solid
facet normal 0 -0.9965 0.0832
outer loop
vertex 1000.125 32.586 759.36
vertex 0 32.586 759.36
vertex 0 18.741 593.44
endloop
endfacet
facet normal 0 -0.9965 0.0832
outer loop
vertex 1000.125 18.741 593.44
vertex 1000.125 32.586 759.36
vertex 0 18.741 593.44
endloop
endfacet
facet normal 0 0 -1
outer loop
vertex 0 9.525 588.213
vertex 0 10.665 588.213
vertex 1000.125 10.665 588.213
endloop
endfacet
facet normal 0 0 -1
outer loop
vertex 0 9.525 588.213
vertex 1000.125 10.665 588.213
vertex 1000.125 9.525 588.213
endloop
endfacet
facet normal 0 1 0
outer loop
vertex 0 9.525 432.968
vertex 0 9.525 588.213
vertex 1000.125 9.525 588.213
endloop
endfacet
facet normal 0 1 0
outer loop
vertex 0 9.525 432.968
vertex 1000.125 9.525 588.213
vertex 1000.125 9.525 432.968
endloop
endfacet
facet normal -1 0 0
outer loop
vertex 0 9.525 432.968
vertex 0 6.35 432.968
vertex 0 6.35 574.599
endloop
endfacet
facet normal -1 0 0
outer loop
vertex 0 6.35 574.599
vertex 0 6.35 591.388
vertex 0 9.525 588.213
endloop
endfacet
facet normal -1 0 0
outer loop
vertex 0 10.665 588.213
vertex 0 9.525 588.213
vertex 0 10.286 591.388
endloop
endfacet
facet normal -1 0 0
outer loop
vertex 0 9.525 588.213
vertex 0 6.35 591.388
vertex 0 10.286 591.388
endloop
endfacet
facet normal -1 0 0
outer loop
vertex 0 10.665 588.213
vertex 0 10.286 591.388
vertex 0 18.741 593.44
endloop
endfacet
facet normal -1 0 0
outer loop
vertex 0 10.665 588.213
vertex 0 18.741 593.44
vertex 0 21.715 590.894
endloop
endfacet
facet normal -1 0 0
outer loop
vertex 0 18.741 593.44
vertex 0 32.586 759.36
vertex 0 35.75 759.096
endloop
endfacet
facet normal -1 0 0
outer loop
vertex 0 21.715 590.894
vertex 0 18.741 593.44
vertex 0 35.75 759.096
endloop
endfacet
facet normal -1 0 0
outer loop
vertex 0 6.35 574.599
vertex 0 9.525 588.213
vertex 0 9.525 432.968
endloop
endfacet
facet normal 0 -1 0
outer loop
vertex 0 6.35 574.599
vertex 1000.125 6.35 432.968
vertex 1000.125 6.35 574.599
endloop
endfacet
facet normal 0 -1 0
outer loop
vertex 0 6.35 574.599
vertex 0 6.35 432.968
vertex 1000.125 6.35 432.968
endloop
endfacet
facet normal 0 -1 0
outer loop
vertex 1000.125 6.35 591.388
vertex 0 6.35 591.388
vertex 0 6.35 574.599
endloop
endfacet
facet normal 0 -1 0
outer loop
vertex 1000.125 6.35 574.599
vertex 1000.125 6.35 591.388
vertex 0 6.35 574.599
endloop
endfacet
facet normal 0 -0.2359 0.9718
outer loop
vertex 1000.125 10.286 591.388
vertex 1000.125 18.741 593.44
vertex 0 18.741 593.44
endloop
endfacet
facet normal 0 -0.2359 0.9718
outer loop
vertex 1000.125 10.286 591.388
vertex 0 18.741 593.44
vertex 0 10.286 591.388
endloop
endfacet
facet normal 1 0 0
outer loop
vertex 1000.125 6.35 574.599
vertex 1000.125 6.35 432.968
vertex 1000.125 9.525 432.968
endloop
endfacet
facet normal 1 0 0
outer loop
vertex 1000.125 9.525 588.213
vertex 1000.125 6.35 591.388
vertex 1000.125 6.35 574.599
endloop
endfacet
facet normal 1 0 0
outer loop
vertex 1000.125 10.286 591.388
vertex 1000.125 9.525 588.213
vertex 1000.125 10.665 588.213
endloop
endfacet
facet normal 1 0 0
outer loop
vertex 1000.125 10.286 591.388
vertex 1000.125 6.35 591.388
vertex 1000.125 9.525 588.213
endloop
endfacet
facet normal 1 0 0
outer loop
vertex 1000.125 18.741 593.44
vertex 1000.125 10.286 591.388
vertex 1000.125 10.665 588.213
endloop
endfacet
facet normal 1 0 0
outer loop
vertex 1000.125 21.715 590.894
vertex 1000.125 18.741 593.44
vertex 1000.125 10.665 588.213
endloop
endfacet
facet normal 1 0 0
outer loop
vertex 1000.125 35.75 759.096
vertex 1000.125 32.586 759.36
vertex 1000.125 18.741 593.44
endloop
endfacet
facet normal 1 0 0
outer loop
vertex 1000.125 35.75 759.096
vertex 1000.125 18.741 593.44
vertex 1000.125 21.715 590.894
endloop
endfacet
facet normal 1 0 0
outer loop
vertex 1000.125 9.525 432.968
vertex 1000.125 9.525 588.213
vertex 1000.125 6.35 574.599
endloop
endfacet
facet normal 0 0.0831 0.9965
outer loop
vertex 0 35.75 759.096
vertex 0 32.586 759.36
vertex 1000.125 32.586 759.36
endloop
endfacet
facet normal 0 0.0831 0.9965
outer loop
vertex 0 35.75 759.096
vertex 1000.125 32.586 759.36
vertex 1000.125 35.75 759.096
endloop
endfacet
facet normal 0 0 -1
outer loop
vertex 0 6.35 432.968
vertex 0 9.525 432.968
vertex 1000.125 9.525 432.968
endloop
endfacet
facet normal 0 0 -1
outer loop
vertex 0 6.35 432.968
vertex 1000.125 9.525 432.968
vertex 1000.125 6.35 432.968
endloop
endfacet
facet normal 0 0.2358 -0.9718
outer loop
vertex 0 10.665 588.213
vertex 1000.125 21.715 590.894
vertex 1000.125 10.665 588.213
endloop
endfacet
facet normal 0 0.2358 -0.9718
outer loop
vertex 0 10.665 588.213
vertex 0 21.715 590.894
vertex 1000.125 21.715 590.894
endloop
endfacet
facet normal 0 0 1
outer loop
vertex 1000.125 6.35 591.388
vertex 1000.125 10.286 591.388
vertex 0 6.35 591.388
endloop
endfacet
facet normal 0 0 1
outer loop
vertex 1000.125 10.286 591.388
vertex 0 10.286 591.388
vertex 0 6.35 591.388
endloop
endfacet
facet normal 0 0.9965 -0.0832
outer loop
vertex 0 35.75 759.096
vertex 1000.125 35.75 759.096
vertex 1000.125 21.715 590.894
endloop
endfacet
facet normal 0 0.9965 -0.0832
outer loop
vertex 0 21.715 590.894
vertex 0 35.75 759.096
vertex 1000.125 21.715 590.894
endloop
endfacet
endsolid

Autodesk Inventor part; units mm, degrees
ref_plane "YZ Plane" through (0, 0, 0) normal (1, 0, 0) x (0, 1, 0)
ref_plane "XZ Plane" through (0, 0, 0) normal (0, 1, 0) x (-1, 0, 0)
ref_plane "XY Plane" through (0, 0, 0) normal (0, 0, 1) x (1, 0, 0)
sketch "Sketch1" plane through (0, 0, 0) normal (1, 0, 0) x (0, 1, 0)
  line L0 (0, 0) -> (0, 597.7382)
  line L1 (0, 0) -> (3.175, 0)
  line L2 (3.175, 0) -> (3.175, 594.5632)
  line L3 (3.175, 594.5632) -> (9.906, 594.5632)
  line L4 (9.906, 594.5632) -> (15.756, 595.9828)
  line L5 (0, 597.7382) -> (9.5263, 597.7382)
  line L6 (9.5263, 597.7382) -> (12.7824, 598.5283)
  line L7 (41.2921, 902.0052) -> (15.756, 595.9828)
  line L8 (12.7824, 598.5283) -> (38.1281, 902.2692)
  line L9 (38.1281, 902.2692) -> (41.2921, 902.0052)
  line L10 (41.2921, 902.0052) -> (44.4671, 901.7403)
  line L11 (44.4671, 901.7403) -> (18.7409, 593.44)
  line L12 (18.7409, 593.44) -> (10.2857, 591.3882)
  line L13 (10.2857, 591.3882) -> (6.35, 591.3882)
  line L14 (6.35, 591.3882) -> (6.35, 574.5988)
  line L15 (6.35, 574.5988) -> (3.175, 574.5988)
  line L16 (44.4671, 901.7403) -> (47.6311, 901.4763)
  line L17 (47.6311, 901.4763) -> (21.7146, 590.8944)
  line L18 (21.7146, 590.8944) -> (10.6654, 588.2132)
  line L19 (10.6654, 588.2132) -> (9.525, 588.2132)
  line L20 (9.525, 588.2132) -> (9.525, 432.9684)
  line L21 (9.525, 432.9684) -> (6.35, 432.9684)
  line L22 (6.35, 432.9684) -> (6.35, 574.5988)
  line L23 (32.5862, 759.3601) -> (35.7502, 759.0961)
  point P0 (14.5133, 592.4141)
  dimension "d0" = 594.5632
  dimension "d1" = 3.175
  dimension "d2" = 6.731
  dimension "d7" = 3.175
  dimension "d8" = 6.0198
  dimension "d9" = 166.36
  dimension "d10" = 3.175
  dimension "d11" = 108.41
  dimension "d12" = 3.175
  dimension "d13" = 307.086
  dimension "d18" = 3.175
  dimension "d20" = 307.1025
  dimension "d21" = 8.7006
  dimension "d22" = 3.175
  dimension "d23" = 3.175
  dimension "d24" = 3.9357
  dimension "d25" = 16.7894
  dimension "d28" = 3.175
  dimension "d29" = 3.186
  dimension "d30" = 3.175
  dimension "d32" = 3.175
  dimension "d33" = 3.175
  dimension "d34" = 142.875
  dimension "d35" = 168.7862
  dimension "d36" = 11.3698
  dimension "d37" = 1.1404
  dimension "d38" = 155.2448
extrude "Extrusion3" add sketch "Sketch1" along normal blind 1000.125 contours L14 L13 L12 L11 L23 L17 L18 L19 L20 L21 L22
properties part number "Second_Shingle_Over_Intake_Vent_With_Length_39.375_Inches"
